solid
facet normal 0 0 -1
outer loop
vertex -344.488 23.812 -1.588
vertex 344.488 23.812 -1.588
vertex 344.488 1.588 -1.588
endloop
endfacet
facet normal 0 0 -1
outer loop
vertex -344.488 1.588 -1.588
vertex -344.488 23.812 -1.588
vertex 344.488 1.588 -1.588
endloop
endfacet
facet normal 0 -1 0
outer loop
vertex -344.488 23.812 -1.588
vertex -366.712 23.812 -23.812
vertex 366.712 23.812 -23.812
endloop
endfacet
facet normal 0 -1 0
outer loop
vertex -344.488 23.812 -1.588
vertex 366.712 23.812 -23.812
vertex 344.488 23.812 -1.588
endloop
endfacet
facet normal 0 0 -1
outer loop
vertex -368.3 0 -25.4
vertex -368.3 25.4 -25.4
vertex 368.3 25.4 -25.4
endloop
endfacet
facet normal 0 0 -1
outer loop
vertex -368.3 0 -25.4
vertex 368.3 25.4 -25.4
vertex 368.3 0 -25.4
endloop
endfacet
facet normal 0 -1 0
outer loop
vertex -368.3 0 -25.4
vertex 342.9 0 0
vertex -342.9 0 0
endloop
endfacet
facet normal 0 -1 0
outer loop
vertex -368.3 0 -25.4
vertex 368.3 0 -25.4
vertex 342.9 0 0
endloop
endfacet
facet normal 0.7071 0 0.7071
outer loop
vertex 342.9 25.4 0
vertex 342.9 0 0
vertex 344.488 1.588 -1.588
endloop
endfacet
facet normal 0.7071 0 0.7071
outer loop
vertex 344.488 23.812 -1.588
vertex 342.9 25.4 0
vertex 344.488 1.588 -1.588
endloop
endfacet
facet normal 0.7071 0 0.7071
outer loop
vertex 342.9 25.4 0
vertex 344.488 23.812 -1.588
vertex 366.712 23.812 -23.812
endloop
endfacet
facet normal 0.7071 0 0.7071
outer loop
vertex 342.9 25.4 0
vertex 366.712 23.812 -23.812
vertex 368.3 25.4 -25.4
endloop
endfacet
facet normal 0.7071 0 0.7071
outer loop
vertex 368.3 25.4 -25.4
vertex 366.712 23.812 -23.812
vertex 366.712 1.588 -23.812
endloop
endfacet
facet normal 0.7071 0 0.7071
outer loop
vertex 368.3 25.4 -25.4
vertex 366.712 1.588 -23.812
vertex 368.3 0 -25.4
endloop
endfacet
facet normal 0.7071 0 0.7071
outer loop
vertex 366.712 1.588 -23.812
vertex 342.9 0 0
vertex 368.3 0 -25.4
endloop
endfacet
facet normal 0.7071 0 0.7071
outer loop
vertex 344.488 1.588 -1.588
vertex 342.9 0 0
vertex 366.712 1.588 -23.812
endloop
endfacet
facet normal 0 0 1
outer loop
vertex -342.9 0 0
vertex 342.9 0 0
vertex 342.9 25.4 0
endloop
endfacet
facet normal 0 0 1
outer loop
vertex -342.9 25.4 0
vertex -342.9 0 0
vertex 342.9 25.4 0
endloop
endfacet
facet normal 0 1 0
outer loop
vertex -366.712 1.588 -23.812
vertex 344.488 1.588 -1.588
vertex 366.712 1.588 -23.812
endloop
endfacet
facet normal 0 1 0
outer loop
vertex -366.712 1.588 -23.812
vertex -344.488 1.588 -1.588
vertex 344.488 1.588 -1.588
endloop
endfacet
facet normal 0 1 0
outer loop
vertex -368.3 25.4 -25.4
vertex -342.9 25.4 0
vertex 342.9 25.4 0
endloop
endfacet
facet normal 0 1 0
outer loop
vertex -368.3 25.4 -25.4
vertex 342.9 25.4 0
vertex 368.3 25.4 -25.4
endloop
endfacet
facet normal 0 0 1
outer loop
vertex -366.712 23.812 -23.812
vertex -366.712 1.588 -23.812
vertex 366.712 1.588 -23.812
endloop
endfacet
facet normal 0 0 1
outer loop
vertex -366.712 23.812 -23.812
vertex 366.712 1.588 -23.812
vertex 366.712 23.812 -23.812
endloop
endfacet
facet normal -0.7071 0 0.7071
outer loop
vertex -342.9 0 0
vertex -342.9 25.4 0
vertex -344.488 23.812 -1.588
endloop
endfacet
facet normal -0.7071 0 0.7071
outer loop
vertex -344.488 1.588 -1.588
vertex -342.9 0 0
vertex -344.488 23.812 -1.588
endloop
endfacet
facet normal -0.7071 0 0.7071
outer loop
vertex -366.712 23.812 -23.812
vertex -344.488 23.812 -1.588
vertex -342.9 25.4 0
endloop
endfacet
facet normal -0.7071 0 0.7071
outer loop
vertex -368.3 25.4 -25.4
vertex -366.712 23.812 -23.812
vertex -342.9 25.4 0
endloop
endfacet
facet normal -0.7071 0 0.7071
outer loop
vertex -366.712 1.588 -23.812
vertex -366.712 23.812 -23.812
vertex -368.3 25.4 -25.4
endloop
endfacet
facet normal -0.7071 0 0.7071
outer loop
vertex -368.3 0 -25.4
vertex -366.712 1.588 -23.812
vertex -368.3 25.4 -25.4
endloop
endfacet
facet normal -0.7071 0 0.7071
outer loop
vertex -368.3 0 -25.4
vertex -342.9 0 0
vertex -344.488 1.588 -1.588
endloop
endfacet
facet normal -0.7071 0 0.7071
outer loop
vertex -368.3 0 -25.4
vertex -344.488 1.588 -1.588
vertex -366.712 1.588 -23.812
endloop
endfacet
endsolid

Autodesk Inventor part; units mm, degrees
ref_plane "YZ Plane" through (0, 0, 0) normal (1, 0, 0) x (0, 1, 0)
ref_plane "XZ Plane" through (0, 0, 0) normal (0, 1, 0) x (-1, 0, 0)
ref_plane "XY Plane" through (0, 0, 0) normal (0, 0, 1) x (1, 0, 0)
sketch "Sketch1" plane through (0, 0, 0) normal (1, 0, 0) x (0, 1, 0)
  line L0 (0, 0) -> (25.4, 0)
  line L1 (25.4, 0) -> (25.4, -25.4)
  line L2 (25.4, -25.4) -> (0, -25.4)
  line L3 (0, -25.4) -> (0, 0)
  line L4 (23.8125, -1.5875) -> (1.5875, -1.5875)
  line L5 (1.5875, -1.5875) -> (1.5875, -23.8125)
  line L6 (1.5875, -23.8125) -> (23.8125, -23.8125)
  line L7 (23.8125, -23.8125) -> (23.8125, -1.5875)
  dimension "d0" = 25.4
  dimension "d1" = 25.4
  dimension "d2" = 1.5875
extrude "Extrusion1" add sketch "Sketch1" along normal mid plane 736.6
chamfer "Chamfer1" distance 25.4 angle 45 2 edges at (-368.3, 12.7, 0) (368.3, 12.7, 0)
properties part number "FRA_TopSide_004" material "Aluminum 6061"
